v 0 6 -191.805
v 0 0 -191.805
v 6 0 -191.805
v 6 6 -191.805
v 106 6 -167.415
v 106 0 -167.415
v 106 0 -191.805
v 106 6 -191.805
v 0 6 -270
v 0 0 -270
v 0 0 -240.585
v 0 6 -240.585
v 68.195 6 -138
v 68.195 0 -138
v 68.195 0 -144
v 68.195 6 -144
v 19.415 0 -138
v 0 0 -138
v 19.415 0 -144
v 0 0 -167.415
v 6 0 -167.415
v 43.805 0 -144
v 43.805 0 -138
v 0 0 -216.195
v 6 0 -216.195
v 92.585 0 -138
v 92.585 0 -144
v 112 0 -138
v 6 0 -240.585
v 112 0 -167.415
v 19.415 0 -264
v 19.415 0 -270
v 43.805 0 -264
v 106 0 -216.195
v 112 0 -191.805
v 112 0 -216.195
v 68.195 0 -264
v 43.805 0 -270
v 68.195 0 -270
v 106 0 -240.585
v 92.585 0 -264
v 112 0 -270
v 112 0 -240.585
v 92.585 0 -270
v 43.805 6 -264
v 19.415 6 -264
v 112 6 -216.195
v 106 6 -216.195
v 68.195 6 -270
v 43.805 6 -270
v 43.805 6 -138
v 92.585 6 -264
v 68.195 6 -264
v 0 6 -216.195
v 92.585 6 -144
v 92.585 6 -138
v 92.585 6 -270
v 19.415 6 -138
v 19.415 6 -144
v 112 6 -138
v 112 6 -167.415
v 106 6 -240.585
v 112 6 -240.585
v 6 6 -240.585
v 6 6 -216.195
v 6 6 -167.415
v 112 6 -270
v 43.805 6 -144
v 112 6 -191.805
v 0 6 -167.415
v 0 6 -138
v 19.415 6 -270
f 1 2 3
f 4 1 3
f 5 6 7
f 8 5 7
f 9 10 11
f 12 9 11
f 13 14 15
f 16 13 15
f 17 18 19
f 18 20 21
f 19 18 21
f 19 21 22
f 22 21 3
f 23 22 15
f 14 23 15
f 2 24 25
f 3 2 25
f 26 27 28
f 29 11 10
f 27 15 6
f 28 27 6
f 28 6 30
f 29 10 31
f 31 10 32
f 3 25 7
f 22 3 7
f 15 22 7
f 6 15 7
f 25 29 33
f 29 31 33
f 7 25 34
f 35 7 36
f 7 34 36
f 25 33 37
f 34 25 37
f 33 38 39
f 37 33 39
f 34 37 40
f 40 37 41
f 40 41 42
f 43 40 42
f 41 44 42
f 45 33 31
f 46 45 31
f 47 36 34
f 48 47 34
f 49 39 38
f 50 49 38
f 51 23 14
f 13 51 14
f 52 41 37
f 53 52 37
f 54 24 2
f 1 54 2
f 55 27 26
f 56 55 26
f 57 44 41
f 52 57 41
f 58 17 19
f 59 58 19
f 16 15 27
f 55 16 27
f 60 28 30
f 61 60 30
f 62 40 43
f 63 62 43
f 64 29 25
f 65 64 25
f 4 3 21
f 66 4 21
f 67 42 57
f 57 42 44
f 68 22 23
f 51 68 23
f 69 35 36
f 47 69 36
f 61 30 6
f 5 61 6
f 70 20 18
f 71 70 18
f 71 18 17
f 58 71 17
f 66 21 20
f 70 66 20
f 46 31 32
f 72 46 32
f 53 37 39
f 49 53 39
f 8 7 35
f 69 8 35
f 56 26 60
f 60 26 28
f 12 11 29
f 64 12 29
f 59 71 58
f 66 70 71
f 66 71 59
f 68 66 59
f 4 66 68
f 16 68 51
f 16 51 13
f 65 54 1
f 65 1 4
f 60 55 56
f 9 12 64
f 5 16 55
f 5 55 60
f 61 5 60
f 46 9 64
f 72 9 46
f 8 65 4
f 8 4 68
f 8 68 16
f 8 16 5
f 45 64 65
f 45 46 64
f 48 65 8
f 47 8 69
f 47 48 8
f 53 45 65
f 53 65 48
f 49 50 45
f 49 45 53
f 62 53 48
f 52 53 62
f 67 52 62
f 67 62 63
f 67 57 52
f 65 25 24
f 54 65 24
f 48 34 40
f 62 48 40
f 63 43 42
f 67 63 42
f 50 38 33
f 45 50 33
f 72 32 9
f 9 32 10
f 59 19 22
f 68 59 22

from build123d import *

# Parameters (mm, degrees)
BOSS_EXTRUDE1_DEPTH = 6


with BuildPart() as part:
    # Sketch2 → Boss-Extrude1 (new body)
    with BuildSketch(Plane(origin=(0, 0, 0), x_dir=(1, 0, 0), z_dir=(0, 1, 0))):
        Polygon((0, 270), (0, 240.585), (6, 240.585), (6, 216.195), (0, 216.195), (0, 191.805), (6, 191.805), (6, 167.415), (0, 167.415), (0, 143.025), (0, 138), (19.415, 138), (19.415, 144), (43.805, 144), (43.805, 138), (68.195, 138), (68.195, 144), (92.585, 144), (92.585, 138), (112, 138), (112, 167.415), (106, 167.415), (106, 191.805), (112, 191.805), (112, 216.195), (106, 216.195), (106, 240.585), (112, 240.585), (112, 264.975), (112, 270), (92.585, 270), (92.585, 264), (68.195, 264), (68.195, 270), (43.805, 270), (43.805, 264), (19.415, 264), (19.415, 270), align=None)
    extrude(amount=BOSS_EXTRUDE1_DEPTH)


solid = part.part
